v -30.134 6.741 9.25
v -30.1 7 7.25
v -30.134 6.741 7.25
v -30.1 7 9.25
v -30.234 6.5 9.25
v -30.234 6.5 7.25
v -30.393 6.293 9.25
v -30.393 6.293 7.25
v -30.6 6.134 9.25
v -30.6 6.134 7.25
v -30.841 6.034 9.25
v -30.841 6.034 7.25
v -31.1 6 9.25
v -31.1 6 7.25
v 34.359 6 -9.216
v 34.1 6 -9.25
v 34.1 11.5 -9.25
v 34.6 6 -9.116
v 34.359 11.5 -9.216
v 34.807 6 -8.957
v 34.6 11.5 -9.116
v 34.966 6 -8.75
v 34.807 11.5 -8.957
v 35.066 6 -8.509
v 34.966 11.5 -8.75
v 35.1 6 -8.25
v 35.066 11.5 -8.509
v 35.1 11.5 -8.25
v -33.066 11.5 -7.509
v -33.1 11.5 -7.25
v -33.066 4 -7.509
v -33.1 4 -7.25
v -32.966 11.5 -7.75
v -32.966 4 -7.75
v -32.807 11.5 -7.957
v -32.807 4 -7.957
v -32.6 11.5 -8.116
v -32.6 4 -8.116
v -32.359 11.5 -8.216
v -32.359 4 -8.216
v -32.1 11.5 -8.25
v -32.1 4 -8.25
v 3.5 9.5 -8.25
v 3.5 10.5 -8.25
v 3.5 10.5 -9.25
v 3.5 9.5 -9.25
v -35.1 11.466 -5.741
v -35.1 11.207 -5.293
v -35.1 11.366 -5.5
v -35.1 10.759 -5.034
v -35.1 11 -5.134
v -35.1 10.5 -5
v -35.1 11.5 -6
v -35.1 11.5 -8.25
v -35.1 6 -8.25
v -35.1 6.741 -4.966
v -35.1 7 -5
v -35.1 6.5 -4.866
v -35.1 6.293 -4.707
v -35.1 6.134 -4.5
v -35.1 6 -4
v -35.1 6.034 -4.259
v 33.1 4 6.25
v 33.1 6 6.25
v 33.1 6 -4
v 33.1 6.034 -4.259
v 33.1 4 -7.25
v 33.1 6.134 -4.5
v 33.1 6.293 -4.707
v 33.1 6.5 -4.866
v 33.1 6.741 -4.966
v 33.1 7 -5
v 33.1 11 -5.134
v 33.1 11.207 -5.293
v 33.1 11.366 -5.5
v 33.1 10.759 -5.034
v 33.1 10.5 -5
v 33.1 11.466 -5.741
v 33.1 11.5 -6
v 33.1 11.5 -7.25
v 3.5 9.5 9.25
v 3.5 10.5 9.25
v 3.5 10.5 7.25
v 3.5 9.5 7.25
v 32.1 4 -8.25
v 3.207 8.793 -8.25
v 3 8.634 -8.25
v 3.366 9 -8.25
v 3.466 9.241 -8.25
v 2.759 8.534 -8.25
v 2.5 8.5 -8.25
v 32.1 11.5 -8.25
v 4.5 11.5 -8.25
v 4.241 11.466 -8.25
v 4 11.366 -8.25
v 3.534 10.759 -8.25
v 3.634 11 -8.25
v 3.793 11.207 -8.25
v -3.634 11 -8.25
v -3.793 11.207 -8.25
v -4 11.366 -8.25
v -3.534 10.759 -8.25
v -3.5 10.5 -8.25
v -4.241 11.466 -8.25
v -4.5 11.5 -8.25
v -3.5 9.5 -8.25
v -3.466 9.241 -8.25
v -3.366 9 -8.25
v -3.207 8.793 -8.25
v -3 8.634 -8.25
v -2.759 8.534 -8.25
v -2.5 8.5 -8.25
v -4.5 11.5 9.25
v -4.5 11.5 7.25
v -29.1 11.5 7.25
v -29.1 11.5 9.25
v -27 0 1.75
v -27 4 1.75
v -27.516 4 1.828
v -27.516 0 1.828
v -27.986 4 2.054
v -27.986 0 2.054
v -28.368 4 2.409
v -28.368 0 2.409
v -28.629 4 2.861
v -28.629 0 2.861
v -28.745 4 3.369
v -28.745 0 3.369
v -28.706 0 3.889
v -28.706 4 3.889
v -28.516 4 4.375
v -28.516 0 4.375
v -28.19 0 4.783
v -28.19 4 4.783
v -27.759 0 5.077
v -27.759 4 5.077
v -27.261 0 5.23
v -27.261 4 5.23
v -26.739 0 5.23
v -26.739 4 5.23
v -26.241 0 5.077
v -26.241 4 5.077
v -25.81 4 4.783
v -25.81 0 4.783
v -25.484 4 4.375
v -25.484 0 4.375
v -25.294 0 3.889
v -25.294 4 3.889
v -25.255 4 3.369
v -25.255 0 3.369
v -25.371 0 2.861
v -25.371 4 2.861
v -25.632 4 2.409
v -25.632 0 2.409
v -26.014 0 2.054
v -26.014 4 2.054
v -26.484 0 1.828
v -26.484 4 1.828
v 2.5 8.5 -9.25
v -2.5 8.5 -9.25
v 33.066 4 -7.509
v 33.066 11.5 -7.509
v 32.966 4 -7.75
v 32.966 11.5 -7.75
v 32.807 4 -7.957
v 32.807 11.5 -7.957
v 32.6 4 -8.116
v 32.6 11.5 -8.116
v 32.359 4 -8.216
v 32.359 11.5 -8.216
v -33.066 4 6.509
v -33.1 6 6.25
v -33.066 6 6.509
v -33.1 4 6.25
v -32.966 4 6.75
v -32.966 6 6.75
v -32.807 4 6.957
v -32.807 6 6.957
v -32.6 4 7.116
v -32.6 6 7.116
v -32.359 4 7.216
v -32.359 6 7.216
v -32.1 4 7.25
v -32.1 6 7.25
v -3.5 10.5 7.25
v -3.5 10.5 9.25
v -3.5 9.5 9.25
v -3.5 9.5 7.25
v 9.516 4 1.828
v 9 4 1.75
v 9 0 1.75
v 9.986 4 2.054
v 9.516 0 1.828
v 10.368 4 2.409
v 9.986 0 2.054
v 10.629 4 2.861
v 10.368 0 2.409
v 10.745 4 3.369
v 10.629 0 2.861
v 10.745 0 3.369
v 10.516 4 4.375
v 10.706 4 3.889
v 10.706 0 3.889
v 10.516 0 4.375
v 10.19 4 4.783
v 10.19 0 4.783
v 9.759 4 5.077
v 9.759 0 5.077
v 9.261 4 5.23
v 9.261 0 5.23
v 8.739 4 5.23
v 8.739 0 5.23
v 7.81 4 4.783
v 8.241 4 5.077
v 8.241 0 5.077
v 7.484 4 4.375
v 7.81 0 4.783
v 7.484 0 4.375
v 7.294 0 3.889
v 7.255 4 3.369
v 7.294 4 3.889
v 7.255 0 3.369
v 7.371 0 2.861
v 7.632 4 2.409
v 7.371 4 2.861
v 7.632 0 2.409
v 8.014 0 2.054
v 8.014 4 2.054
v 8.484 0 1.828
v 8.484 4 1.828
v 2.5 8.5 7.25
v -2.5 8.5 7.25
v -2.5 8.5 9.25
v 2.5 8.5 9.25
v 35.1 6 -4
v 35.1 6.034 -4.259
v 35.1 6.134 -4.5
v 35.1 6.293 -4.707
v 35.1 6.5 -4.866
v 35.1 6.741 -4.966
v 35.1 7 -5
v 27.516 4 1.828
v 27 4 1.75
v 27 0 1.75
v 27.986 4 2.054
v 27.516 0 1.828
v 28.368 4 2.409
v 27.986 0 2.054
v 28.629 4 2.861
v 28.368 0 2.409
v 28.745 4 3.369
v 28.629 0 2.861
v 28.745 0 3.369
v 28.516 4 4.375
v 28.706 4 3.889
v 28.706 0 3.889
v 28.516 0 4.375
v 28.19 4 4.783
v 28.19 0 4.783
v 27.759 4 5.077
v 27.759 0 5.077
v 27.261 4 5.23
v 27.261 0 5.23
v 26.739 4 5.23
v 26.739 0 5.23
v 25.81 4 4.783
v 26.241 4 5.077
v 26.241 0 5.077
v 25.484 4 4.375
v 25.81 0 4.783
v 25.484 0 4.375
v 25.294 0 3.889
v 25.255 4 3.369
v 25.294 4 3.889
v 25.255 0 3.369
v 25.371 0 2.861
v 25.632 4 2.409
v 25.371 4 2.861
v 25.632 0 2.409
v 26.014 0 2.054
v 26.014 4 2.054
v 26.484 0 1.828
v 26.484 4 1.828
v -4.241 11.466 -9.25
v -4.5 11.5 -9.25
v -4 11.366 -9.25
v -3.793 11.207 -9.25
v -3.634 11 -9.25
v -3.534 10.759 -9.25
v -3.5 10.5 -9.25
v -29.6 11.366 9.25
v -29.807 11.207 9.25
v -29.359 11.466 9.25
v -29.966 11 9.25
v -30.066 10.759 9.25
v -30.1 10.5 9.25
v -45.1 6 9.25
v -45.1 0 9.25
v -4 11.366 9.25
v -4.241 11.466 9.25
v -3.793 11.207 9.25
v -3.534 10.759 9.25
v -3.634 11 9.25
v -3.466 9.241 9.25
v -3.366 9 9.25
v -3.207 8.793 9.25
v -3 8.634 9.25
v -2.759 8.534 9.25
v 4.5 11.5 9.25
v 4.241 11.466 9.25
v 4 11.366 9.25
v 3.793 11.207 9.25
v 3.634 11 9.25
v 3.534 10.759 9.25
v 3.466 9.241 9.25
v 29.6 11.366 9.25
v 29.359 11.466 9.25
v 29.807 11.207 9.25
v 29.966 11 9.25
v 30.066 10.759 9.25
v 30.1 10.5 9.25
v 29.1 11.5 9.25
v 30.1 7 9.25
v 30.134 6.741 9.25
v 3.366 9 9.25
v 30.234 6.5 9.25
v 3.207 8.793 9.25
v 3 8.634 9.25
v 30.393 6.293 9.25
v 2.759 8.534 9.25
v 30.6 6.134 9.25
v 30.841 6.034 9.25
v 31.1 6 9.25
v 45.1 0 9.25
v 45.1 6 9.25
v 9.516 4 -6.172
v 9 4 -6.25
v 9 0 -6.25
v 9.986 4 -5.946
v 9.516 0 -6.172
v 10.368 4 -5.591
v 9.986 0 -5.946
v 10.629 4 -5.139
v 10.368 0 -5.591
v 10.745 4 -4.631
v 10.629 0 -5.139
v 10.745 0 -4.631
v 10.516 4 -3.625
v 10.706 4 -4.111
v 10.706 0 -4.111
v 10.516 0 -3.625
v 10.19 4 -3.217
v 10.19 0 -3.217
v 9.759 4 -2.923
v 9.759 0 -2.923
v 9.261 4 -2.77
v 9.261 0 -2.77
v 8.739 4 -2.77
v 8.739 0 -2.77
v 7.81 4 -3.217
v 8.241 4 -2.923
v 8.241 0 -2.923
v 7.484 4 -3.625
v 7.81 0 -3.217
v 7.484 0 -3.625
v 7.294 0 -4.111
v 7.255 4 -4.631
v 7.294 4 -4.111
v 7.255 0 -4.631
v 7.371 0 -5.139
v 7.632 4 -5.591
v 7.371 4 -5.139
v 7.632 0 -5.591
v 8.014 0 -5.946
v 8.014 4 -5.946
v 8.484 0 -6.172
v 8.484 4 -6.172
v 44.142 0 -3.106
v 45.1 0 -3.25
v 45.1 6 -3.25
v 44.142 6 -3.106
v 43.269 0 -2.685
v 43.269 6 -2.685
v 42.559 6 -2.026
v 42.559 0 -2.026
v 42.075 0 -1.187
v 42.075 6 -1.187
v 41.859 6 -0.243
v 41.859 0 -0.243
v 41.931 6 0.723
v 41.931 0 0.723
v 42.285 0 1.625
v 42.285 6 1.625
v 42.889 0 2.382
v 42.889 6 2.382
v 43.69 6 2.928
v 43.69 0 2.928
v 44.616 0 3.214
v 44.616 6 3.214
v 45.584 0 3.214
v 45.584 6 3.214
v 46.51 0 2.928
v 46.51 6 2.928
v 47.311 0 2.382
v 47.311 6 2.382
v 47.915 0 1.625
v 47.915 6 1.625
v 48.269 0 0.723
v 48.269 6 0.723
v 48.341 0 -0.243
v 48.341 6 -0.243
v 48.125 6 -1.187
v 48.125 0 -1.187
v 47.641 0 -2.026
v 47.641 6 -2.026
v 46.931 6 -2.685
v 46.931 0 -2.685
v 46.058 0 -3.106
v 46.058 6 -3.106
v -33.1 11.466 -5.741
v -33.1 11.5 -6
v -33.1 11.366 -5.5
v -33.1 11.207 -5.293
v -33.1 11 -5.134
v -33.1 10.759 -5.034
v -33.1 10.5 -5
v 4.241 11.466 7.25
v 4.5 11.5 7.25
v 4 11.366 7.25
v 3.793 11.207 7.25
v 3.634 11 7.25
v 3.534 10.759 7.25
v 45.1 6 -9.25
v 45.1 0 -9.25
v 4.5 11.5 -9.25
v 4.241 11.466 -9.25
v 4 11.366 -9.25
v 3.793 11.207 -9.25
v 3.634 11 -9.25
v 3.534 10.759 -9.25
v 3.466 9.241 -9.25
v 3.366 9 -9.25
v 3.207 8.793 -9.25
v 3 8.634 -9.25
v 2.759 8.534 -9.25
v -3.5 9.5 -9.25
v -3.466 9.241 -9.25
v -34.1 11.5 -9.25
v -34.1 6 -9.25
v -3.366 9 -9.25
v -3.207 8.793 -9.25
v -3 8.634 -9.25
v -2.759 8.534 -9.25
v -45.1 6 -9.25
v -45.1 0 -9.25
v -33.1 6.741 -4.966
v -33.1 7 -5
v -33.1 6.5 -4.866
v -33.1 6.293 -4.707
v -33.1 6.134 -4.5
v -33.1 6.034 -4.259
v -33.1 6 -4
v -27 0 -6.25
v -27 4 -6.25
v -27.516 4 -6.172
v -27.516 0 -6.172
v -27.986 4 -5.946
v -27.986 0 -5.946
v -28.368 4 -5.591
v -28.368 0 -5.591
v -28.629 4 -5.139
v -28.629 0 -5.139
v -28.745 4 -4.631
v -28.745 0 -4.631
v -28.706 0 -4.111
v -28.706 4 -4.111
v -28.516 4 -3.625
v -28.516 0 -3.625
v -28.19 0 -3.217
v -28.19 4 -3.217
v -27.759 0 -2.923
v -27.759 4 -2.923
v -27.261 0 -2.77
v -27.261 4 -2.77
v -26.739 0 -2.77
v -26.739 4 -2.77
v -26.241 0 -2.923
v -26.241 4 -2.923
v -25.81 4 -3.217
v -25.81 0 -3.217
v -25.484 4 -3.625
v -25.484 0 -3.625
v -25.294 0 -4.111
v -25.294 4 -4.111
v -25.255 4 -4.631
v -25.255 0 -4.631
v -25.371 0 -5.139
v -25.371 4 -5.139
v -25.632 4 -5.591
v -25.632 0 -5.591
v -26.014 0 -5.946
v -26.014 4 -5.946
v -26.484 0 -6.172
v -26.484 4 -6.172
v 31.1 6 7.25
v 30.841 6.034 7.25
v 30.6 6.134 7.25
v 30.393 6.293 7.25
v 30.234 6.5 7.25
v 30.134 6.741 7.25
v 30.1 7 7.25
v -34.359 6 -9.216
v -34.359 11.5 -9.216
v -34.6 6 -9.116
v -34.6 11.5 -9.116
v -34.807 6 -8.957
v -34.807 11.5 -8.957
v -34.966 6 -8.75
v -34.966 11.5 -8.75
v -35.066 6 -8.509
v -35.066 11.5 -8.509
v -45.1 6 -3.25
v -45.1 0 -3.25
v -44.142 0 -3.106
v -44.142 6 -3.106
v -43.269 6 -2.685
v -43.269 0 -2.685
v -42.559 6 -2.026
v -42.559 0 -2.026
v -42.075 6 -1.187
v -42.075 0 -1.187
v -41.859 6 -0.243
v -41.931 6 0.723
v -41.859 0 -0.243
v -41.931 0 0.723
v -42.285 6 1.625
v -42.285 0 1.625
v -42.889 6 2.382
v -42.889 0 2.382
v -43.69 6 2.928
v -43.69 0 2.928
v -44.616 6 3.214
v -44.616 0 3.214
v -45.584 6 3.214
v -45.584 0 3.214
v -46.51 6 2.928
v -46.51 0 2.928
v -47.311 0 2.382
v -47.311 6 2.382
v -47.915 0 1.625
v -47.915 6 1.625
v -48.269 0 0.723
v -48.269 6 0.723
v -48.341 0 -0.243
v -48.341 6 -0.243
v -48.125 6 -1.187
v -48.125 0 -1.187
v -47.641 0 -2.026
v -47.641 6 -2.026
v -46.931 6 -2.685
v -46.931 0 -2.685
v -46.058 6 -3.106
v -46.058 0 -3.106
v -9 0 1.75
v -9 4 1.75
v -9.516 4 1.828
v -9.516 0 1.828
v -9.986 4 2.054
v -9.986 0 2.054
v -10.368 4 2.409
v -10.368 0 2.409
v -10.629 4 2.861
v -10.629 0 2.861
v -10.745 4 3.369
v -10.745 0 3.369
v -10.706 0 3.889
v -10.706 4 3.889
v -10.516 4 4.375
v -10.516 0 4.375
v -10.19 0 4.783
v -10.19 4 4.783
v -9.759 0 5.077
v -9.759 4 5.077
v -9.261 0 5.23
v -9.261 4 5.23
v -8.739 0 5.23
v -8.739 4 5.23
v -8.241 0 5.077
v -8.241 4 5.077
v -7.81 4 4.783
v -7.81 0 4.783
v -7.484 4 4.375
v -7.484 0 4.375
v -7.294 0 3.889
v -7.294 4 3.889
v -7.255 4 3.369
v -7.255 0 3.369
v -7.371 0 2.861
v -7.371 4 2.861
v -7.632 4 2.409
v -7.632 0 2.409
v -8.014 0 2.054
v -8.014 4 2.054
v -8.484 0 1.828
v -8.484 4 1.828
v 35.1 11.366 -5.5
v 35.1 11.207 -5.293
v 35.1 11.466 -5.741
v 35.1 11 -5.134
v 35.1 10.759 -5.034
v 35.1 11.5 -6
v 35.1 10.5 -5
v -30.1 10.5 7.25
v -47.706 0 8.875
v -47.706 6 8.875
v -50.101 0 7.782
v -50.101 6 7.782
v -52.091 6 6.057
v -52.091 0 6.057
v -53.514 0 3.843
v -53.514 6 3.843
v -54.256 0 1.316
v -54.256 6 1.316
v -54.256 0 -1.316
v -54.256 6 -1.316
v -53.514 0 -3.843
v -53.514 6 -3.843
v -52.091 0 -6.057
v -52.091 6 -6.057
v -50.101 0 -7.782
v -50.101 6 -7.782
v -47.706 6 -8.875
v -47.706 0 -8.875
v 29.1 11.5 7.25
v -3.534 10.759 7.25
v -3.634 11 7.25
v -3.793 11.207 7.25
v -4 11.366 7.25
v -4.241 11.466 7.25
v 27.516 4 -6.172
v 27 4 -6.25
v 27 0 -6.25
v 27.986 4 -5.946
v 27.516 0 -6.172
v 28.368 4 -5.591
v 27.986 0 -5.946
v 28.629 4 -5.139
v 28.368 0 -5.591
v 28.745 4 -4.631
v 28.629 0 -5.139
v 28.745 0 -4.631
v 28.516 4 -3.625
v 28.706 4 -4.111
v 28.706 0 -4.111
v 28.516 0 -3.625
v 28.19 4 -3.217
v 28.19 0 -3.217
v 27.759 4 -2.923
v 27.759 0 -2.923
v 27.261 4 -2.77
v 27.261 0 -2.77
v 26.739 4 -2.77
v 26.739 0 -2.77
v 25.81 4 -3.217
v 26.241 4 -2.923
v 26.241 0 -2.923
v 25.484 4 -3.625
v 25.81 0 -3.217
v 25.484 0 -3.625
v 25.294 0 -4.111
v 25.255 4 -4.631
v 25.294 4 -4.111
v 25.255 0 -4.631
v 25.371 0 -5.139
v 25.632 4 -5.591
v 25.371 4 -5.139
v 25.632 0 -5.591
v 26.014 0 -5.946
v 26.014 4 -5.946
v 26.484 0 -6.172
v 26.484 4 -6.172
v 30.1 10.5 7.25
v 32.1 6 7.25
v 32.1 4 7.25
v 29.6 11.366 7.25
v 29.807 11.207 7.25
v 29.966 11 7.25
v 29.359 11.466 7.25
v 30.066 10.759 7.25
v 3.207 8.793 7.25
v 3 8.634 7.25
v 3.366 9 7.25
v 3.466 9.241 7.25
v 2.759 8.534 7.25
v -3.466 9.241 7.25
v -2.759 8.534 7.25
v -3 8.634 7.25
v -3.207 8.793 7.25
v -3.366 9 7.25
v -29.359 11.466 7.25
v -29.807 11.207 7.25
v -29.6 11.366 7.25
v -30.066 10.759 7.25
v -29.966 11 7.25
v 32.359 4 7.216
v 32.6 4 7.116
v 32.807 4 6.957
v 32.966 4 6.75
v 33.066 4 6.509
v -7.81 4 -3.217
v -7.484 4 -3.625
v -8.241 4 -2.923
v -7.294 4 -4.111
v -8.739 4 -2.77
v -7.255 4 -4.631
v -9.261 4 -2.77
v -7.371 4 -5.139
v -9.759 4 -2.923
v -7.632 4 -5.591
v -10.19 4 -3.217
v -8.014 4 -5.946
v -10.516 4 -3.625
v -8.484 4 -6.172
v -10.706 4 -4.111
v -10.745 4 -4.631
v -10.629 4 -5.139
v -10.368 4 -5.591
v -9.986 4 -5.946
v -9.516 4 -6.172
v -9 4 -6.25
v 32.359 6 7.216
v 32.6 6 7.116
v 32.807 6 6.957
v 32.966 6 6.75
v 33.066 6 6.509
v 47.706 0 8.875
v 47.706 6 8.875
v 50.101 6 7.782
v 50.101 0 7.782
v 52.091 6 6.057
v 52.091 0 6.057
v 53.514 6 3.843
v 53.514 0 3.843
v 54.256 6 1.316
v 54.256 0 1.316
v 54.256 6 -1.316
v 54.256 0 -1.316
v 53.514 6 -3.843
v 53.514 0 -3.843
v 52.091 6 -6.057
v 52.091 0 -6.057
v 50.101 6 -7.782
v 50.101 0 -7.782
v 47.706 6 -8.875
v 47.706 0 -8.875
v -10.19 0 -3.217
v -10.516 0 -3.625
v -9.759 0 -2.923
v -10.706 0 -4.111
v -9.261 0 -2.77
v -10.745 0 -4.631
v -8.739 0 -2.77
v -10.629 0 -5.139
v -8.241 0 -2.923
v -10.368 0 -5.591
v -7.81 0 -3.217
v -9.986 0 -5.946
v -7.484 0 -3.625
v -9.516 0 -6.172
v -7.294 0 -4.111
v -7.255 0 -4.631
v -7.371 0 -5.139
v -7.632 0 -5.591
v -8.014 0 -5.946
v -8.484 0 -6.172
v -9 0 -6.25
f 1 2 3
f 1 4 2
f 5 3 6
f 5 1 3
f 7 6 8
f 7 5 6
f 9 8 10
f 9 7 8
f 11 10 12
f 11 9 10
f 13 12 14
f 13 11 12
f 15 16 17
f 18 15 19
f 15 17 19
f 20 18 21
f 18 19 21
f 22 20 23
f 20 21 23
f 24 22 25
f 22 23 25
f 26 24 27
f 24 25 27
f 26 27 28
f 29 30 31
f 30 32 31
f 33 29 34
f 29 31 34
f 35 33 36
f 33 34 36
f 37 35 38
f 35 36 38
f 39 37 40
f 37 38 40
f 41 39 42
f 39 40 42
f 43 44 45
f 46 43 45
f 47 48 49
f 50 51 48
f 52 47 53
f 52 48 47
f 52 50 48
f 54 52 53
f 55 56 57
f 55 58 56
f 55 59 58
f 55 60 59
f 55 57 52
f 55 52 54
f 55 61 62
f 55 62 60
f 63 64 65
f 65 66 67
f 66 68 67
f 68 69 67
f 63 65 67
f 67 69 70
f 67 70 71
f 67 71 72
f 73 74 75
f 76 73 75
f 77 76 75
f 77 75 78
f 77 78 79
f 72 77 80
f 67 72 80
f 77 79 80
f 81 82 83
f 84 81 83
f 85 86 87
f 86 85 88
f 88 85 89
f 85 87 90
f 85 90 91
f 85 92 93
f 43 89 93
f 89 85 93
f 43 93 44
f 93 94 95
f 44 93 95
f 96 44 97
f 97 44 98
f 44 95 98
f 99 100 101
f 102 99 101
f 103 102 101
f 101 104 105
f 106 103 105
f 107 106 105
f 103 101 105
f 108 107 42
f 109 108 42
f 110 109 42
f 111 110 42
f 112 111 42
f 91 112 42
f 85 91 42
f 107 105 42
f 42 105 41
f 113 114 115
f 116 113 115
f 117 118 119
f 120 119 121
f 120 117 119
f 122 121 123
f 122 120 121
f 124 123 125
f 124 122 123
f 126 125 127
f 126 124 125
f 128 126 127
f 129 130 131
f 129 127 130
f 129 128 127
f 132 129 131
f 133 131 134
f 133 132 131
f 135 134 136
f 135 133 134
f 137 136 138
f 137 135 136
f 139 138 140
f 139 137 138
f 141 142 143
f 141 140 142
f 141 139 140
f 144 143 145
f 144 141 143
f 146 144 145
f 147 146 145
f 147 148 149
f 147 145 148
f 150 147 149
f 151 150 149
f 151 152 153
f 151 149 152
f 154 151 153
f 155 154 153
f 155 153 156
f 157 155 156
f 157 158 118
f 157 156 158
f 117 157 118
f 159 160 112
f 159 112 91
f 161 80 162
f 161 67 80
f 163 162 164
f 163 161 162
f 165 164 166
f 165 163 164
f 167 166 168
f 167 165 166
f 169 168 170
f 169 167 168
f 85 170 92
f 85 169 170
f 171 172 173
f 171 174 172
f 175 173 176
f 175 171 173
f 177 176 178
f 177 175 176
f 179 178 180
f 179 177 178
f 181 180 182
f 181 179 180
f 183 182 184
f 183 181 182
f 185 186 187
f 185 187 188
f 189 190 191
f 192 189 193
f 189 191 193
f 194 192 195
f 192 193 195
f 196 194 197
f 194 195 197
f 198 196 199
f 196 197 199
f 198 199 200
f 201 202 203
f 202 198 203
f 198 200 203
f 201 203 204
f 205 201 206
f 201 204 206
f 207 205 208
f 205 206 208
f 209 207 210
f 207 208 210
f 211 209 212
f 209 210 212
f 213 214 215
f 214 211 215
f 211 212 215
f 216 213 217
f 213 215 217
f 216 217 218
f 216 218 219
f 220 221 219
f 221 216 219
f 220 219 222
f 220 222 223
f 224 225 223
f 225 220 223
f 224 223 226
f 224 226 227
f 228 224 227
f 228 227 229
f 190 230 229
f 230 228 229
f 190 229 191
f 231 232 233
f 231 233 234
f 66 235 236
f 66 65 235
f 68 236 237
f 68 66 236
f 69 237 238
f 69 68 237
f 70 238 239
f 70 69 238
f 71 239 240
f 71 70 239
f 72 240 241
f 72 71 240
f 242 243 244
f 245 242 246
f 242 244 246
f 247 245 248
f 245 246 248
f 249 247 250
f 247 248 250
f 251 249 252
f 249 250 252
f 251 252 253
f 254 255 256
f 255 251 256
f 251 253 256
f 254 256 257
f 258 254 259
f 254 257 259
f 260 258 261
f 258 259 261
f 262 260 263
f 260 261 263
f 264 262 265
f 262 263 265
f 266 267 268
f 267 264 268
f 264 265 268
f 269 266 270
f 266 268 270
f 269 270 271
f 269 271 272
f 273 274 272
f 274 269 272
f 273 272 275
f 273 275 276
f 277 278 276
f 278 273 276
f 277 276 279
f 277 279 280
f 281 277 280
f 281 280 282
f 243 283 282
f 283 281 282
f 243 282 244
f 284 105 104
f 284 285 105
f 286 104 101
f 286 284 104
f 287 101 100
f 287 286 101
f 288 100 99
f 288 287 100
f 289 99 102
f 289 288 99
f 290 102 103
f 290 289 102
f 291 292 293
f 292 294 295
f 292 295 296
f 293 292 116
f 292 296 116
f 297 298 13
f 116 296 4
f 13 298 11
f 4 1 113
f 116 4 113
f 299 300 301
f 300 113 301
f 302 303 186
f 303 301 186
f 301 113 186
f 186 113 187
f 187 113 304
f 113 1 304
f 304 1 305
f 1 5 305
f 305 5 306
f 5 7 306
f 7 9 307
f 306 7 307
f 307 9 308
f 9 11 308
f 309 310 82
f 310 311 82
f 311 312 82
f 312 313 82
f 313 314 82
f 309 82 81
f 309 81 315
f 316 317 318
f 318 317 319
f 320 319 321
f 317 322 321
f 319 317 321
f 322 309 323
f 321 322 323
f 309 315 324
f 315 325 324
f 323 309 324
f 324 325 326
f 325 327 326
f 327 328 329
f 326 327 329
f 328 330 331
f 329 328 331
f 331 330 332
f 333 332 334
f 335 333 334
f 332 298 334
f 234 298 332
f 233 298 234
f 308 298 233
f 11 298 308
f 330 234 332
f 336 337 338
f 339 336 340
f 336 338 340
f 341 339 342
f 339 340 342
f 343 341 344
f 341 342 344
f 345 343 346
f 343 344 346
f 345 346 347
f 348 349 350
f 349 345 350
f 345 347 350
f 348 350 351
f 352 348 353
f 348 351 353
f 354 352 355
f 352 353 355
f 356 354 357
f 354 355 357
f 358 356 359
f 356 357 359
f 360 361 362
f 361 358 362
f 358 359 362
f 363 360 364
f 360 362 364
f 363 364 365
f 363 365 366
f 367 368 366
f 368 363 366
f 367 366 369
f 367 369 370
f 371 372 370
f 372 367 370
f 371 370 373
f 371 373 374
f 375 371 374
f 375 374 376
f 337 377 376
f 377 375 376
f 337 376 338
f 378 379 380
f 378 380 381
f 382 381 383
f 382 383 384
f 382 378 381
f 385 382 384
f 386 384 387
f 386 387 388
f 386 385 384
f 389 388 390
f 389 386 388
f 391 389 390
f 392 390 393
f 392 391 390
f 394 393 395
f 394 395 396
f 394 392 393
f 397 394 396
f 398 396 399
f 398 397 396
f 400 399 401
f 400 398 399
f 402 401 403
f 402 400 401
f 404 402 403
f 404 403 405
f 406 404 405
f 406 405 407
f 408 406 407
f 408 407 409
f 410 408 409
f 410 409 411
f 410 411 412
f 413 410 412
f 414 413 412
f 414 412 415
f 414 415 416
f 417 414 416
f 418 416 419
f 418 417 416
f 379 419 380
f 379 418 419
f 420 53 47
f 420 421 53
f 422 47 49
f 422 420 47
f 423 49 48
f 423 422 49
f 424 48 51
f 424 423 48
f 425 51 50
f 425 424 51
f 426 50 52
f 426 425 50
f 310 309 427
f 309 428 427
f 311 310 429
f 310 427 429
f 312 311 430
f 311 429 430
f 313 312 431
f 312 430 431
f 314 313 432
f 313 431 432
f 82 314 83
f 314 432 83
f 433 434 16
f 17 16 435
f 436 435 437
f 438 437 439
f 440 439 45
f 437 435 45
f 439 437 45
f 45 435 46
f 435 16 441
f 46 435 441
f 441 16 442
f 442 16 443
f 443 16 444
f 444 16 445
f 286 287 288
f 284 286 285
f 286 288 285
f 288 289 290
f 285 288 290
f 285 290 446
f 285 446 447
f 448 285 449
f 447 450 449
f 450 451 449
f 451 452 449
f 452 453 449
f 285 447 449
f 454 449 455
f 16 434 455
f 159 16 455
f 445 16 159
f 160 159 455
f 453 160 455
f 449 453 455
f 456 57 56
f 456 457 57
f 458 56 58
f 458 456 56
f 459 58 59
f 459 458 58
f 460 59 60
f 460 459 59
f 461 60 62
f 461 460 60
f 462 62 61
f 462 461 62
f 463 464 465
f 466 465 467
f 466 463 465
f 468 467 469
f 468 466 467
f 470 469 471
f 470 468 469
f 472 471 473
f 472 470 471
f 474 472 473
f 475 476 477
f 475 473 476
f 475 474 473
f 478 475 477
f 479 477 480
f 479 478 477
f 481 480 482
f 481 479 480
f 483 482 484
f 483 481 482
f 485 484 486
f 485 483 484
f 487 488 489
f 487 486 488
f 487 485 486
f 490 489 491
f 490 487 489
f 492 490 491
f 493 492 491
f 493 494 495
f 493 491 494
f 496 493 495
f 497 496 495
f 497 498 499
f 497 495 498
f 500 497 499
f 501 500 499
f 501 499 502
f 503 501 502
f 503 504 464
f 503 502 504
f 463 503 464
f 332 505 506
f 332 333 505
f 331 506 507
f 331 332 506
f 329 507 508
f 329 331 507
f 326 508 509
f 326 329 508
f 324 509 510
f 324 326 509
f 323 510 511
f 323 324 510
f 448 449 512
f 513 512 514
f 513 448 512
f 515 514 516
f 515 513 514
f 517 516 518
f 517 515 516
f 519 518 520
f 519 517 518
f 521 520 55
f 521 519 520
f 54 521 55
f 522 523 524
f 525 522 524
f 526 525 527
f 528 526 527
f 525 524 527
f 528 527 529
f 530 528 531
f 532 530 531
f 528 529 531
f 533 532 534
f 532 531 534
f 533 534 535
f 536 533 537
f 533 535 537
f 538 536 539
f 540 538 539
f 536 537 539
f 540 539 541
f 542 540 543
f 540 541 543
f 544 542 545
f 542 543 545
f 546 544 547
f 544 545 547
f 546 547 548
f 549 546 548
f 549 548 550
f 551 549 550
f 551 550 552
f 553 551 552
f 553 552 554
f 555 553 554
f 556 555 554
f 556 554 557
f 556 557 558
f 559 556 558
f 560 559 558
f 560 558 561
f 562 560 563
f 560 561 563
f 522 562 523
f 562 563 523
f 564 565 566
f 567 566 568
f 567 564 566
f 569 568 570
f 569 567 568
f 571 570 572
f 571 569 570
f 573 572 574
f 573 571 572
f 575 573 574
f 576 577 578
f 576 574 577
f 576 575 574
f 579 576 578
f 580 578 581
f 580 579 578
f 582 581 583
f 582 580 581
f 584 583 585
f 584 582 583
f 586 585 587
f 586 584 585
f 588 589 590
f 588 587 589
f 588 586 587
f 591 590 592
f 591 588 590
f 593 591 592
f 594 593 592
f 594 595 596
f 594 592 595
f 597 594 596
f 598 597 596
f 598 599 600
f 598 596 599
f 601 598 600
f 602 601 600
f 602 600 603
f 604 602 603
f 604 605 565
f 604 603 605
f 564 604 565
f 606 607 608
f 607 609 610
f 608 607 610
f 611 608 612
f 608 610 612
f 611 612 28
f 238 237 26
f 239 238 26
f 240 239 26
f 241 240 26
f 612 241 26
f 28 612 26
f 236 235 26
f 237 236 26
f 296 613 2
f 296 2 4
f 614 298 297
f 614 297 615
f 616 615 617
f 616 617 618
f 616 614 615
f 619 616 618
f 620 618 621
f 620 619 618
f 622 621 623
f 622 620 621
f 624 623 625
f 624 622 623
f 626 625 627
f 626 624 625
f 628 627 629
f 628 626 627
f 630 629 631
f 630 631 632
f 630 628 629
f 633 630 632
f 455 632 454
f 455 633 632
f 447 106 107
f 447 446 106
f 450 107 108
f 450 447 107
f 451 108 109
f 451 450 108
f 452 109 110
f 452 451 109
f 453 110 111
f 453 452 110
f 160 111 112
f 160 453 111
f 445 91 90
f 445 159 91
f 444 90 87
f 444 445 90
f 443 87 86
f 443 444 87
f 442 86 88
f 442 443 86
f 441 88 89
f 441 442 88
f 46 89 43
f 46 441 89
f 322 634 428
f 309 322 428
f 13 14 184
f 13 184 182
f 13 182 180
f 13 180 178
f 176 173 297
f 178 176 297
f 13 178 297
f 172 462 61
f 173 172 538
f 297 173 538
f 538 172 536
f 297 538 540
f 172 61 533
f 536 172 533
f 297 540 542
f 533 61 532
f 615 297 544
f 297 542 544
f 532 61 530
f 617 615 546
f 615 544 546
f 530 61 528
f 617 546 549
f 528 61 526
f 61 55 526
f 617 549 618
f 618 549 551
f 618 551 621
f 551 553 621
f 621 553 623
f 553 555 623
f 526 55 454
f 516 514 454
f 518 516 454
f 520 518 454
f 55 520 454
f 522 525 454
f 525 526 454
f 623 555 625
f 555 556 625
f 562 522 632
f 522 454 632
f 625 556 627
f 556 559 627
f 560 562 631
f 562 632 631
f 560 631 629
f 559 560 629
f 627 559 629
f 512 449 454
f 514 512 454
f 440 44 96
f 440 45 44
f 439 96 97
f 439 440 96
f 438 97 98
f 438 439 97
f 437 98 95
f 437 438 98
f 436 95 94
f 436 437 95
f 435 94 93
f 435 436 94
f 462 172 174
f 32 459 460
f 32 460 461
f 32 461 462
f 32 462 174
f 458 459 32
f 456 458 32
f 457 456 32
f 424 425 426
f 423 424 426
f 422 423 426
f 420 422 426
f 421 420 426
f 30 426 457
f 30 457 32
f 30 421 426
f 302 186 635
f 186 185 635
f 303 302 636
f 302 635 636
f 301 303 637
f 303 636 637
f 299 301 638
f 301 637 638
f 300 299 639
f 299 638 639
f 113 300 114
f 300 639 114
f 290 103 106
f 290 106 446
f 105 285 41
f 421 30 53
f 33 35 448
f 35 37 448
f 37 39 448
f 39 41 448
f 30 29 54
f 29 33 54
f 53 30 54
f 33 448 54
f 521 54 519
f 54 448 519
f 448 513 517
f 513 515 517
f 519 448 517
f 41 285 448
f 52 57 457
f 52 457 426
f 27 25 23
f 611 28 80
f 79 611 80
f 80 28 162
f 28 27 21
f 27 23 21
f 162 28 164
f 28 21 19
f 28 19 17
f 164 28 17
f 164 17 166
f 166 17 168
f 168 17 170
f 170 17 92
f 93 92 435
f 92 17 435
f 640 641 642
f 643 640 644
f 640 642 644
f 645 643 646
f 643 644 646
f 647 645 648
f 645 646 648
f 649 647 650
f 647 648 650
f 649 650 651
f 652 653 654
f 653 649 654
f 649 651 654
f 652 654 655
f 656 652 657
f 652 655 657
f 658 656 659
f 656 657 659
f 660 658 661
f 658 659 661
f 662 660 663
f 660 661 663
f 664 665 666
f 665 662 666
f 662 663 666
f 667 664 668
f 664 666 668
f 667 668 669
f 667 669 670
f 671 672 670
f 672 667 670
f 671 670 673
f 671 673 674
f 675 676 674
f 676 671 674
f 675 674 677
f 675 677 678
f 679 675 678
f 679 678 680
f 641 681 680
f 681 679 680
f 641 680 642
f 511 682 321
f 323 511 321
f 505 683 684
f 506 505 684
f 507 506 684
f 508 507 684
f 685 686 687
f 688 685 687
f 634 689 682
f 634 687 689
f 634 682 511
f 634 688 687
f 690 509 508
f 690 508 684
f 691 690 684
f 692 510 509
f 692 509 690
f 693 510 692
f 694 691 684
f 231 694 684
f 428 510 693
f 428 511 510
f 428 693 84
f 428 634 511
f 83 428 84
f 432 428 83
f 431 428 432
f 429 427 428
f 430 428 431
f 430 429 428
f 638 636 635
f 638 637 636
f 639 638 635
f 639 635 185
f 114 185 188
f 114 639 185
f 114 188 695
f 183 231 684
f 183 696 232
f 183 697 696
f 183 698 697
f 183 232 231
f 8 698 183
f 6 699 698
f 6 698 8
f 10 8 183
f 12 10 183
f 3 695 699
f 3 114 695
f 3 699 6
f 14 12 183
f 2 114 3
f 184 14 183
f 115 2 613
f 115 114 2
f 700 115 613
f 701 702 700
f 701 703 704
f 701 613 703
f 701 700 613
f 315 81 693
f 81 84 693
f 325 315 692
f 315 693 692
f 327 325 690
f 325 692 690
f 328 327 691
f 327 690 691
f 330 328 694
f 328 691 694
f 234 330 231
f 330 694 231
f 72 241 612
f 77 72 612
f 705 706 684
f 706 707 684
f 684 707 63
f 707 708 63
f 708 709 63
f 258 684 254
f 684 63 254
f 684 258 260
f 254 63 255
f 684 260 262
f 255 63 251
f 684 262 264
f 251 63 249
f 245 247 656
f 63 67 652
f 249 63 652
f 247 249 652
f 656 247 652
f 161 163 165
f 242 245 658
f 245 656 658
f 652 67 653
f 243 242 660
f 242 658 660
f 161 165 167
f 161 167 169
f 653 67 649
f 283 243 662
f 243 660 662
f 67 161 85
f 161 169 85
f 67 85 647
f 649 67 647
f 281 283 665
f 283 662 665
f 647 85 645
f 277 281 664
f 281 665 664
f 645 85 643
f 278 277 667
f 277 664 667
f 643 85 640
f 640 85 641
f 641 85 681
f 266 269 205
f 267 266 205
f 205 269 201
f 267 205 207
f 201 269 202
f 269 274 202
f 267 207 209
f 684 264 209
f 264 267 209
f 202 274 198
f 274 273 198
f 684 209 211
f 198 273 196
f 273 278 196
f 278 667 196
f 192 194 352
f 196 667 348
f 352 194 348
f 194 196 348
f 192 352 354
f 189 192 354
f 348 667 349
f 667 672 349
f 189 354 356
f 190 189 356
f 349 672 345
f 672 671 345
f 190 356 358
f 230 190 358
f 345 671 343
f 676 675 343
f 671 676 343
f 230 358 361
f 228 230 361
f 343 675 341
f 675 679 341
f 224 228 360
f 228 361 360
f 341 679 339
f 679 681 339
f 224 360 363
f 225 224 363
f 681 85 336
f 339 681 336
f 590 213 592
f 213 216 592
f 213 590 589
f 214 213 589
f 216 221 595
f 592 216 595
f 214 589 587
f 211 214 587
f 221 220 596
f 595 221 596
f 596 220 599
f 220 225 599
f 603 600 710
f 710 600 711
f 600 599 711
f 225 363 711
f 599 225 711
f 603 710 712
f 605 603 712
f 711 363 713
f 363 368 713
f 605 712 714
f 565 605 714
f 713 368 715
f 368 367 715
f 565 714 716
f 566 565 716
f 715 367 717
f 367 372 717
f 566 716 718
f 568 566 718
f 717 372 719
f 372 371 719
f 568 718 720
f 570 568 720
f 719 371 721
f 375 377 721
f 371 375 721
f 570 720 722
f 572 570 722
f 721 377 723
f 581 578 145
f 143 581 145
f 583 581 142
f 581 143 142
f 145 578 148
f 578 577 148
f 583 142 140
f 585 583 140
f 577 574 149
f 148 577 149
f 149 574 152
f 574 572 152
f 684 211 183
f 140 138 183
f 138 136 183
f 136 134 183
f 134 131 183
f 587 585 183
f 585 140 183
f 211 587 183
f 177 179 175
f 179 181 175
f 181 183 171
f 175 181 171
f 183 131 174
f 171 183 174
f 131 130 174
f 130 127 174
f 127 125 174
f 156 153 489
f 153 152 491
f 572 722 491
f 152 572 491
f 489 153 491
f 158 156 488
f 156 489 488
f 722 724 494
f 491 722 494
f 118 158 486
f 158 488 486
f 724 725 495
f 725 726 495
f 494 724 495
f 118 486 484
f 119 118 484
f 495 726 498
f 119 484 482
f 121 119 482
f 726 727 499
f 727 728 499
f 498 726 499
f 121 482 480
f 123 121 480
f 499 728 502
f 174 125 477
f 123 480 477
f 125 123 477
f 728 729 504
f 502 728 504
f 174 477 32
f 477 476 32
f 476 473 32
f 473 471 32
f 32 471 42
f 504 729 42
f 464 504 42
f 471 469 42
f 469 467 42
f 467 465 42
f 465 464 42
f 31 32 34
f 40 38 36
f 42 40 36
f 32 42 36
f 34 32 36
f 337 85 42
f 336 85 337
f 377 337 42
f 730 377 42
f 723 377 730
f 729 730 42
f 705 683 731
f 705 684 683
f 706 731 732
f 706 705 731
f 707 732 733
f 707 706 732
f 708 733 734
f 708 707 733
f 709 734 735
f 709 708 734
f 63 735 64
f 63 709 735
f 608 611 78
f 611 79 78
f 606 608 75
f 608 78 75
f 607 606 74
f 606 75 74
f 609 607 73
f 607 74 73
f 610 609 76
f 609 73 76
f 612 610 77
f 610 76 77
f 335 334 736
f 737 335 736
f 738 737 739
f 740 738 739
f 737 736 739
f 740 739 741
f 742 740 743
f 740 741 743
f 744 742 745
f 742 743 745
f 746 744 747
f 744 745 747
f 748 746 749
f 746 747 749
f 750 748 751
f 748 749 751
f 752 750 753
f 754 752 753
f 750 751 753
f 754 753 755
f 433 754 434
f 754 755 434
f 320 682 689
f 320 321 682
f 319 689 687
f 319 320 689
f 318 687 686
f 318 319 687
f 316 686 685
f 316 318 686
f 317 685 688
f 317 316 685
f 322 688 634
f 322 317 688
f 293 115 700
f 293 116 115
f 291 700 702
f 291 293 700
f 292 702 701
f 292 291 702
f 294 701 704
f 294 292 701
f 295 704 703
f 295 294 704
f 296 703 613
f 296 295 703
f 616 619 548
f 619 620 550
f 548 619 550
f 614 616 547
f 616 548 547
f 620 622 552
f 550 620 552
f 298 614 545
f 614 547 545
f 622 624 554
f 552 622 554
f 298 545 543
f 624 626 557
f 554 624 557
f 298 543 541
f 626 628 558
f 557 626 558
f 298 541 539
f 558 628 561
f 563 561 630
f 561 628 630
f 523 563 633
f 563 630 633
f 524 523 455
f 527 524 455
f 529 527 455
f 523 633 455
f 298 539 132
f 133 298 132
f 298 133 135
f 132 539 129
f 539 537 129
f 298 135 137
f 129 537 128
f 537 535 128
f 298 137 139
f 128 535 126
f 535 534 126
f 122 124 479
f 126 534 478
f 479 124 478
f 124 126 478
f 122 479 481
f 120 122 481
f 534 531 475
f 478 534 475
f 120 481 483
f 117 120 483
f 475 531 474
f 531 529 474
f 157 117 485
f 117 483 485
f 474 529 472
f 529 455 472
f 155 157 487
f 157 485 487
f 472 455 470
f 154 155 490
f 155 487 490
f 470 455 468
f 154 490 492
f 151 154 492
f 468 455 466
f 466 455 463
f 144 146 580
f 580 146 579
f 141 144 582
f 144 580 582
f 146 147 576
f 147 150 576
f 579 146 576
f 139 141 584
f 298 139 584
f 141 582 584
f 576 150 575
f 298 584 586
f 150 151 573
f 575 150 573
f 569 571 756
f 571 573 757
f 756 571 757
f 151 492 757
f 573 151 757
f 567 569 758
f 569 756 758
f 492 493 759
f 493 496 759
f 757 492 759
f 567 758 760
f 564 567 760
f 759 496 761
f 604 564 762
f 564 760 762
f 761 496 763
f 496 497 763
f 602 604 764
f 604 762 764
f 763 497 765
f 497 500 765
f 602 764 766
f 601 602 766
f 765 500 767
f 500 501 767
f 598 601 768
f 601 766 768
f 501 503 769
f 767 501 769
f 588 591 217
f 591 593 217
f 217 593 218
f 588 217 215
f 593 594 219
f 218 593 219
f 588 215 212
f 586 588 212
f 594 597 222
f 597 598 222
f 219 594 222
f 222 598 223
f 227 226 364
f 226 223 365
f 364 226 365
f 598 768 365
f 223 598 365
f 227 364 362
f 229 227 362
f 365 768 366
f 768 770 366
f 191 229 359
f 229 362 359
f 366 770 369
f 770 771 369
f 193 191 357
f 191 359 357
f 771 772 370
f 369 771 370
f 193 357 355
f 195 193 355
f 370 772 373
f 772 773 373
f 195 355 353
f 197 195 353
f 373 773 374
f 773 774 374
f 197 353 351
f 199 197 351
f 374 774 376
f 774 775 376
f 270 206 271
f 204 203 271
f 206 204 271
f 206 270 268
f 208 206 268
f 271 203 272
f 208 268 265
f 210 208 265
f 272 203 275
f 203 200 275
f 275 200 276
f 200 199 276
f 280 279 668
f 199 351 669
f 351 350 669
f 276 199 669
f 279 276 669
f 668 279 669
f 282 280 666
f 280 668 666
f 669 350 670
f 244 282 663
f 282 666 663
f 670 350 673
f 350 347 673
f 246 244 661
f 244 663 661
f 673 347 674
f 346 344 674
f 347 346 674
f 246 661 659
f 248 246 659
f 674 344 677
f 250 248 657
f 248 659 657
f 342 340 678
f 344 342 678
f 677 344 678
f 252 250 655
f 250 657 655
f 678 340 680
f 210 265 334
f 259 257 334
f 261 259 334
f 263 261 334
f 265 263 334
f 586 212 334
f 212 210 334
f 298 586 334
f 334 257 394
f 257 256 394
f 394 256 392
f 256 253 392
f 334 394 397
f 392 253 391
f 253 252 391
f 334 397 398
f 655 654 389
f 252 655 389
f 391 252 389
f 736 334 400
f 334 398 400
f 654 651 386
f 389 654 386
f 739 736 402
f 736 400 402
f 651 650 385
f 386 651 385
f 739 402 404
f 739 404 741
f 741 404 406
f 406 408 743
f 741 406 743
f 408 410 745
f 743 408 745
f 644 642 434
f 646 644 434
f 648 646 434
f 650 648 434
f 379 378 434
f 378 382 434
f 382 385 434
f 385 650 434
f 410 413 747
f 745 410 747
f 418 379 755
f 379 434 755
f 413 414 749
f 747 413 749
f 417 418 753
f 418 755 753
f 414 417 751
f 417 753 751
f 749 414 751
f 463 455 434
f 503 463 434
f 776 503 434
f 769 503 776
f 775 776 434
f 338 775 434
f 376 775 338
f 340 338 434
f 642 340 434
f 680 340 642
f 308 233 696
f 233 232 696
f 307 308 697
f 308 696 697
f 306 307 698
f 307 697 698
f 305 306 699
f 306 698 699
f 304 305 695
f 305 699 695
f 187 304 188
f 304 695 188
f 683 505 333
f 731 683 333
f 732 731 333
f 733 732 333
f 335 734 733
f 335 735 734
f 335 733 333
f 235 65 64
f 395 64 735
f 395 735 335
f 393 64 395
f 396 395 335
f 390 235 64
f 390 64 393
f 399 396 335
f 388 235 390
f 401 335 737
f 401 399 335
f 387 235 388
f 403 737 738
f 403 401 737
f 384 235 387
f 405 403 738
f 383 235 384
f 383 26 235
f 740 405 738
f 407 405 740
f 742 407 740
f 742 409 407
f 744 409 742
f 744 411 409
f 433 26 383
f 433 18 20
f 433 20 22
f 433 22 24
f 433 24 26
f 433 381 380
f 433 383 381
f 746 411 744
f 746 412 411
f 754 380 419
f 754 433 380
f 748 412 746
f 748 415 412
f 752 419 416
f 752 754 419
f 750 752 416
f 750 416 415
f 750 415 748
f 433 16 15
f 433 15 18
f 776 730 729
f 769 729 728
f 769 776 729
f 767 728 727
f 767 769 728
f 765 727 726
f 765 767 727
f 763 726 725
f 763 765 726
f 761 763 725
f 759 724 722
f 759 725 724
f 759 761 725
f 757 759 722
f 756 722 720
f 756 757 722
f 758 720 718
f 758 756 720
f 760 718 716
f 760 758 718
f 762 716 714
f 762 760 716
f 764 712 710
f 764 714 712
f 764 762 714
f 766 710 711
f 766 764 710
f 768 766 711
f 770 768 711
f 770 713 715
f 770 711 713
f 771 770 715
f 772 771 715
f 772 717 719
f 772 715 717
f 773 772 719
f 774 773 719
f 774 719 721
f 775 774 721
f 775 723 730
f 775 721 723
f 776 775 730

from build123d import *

# Parameters (mm, degrees)
SKETCH1_W           = 35.1
SKETCH1_H           = 18.5
BOSS_EXTRUDE1_DEPTH = 11.5
SKETCH7_W           = 33.1
SKETCH7_H           = 15.5
CUT_EXTRUDE5_DEPTH  = 7.5
SKETCH2_R           = 1.75
CUT_EXTRUDE1_DEPTH  = 39.076534769
SKETCH4_W           = 14.25
SKETCH4_H           = 5.5
CUT_EXTRUDE3_DEPTH  = 5
SKETCH8_R           = 3.25
BOLT_EXTRUDE_DEPTH  = 6
FILLET3_R           = 1
SKETCH9_W           = 7
SKETCH9_H           = 18.5
CUT_EXTRUDE6_DEPTH  = 3
FILLET6_R           = 1


with BuildPart() as part:
    # Sketch1 → Boss-Extrude1 (new body)
    with BuildSketch(Plane(origin=(0, 0, 0), x_dir=(1, 0, 0), z_dir=(0, 1, 0))):
        with Locations((-17.55, 0)):
            Rectangle(SKETCH1_W, SKETCH1_H)
    extrude(amount=BOSS_EXTRUDE1_DEPTH)

    # Sketch7 → Cut-Extrude5 (cut)
    with BuildSketch(Plane(origin=(0, 11.5, 0), x_dir=(1, 0, 0), z_dir=(0, 1, 0))):
        with Locations((-16.55, 0.5)):
            Rectangle(SKETCH7_W, SKETCH7_H)
    extrude(amount=-CUT_EXTRUDE5_DEPTH, mode=Mode.SUBTRACT)

    # Sketch2 → Cut-Extrude1 (cut, through all)
    with BuildSketch(Plane(origin=(0, 0, 0), x_dir=(-1, 0, 0), z_dir=(0, 1, 0))):
        with Locations(Location((27, 3.5, 0), (0, 0, 270))):
            Circle(SKETCH2_R)
        with Locations(Location((9, 3.5, 0), (0, 0, 270))):
            Circle(SKETCH2_R)
        with Locations(Location((27, -4.5, 0), (0, 0, 270))):
            Circle(SKETCH2_R)
        with Locations(Location((9, -4.5, 0), (0, 0, 270))):
            Circle(SKETCH2_R)
    extrude(amount=CUT_EXTRUDE1_DEPTH, mode=Mode.SUBTRACT)

    # Sketch4 → Cut-Extrude3 (cut)
    with BuildSketch(Plane.ZY.offset(35.1)):
        with Locations((2.125, 8.75)):
            Rectangle(SKETCH4_W, SKETCH4_H)
    extrude(amount=-CUT_EXTRUDE3_DEPTH, mode=Mode.SUBTRACT)

    # Sketch8 → bolt extrude (add)
    with BuildSketch(Plane(origin=(0, 0, 0), x_dir=(-1, 0, 0), z_dir=(0, -1, 0))):
        with BuildLine():
            Line((35.1, -9.25), (45.1, -9.25))
            ThreePointArc((45.1, -9.25), (54.35, 0), (45.1, 9.25))
            Line((45.1, 9.25), (35.1, 9.25))
            Line((35.1, 9.25), (35.1, -9.25))
        make_face()
        with Locations(Location((45.1, 0, 0), (0, 0, 90))):
            Circle(SKETCH8_R, mode=Mode.SUBTRACT)
    extrude(amount=-BOLT_EXTRUDE_DEPTH)

    # Mirror1: part across plane


with BuildPart() as part_1:
    add(part.part)
    add(part.part.mirror(Plane(origin=(0, 0, 0), x_dir=(0, 0, 1), z_dir=(1, 0, 0))))

    # Fillet3
    fillet3_edges = [part_1.edges().sort_by_distance(p)[0] for p in [
        (-34.1, 6, -5),
        (-34.1, 11.5, -5),
        (-30.1, 11.5, 8.25),
        (-30.1, 6, 8.25),
        (34.1, 11.5, -5),
        (34.1, 6, -5),
        (30.1, 11.5, 8.25),
        (30.1, 6, 8.25),
    ]]
    fillet(fillet3_edges, radius=FILLET3_R)

    # Sketch9 → Cut-Extrude6 (cut)
    with BuildSketch(Plane(origin=(0, 11.5, 0), x_dir=(1, 0, 0), z_dir=(0, 1, 0))):
        Rectangle(SKETCH9_W, SKETCH9_H)
    extrude(amount=-CUT_EXTRUDE6_DEPTH, mode=Mode.SUBTRACT)

    # Fillet6
    fillet6_edges = [part_1.edges().sort_by_distance(p)[0] for p in [
        (-33.1, 7.75, -8.25),
        (-33.1, 5, 7.25),
        (-3.5, 8.5, -8.75),
        (-3.5, 8.5, 8.25),
        (3.5, 8.5, -8.75),
        (3.5, 8.5, 8.25),
        (-3.5, 11.5, -8.75),
        (3.5, 11.5, -8.75),
        (3.5, 11.5, 8.25),
        (-3.5, 11.5, 8.25),
        (-35.1, 8.75, -9.25),
        (35.1, 8.75, -9.25),
        (33.1, 7.75, -8.25),
        (33.1, 5, 7.25),
    ]]
    fillet(fillet6_edges, radius=FILLET6_R)


solid = part_1.part
